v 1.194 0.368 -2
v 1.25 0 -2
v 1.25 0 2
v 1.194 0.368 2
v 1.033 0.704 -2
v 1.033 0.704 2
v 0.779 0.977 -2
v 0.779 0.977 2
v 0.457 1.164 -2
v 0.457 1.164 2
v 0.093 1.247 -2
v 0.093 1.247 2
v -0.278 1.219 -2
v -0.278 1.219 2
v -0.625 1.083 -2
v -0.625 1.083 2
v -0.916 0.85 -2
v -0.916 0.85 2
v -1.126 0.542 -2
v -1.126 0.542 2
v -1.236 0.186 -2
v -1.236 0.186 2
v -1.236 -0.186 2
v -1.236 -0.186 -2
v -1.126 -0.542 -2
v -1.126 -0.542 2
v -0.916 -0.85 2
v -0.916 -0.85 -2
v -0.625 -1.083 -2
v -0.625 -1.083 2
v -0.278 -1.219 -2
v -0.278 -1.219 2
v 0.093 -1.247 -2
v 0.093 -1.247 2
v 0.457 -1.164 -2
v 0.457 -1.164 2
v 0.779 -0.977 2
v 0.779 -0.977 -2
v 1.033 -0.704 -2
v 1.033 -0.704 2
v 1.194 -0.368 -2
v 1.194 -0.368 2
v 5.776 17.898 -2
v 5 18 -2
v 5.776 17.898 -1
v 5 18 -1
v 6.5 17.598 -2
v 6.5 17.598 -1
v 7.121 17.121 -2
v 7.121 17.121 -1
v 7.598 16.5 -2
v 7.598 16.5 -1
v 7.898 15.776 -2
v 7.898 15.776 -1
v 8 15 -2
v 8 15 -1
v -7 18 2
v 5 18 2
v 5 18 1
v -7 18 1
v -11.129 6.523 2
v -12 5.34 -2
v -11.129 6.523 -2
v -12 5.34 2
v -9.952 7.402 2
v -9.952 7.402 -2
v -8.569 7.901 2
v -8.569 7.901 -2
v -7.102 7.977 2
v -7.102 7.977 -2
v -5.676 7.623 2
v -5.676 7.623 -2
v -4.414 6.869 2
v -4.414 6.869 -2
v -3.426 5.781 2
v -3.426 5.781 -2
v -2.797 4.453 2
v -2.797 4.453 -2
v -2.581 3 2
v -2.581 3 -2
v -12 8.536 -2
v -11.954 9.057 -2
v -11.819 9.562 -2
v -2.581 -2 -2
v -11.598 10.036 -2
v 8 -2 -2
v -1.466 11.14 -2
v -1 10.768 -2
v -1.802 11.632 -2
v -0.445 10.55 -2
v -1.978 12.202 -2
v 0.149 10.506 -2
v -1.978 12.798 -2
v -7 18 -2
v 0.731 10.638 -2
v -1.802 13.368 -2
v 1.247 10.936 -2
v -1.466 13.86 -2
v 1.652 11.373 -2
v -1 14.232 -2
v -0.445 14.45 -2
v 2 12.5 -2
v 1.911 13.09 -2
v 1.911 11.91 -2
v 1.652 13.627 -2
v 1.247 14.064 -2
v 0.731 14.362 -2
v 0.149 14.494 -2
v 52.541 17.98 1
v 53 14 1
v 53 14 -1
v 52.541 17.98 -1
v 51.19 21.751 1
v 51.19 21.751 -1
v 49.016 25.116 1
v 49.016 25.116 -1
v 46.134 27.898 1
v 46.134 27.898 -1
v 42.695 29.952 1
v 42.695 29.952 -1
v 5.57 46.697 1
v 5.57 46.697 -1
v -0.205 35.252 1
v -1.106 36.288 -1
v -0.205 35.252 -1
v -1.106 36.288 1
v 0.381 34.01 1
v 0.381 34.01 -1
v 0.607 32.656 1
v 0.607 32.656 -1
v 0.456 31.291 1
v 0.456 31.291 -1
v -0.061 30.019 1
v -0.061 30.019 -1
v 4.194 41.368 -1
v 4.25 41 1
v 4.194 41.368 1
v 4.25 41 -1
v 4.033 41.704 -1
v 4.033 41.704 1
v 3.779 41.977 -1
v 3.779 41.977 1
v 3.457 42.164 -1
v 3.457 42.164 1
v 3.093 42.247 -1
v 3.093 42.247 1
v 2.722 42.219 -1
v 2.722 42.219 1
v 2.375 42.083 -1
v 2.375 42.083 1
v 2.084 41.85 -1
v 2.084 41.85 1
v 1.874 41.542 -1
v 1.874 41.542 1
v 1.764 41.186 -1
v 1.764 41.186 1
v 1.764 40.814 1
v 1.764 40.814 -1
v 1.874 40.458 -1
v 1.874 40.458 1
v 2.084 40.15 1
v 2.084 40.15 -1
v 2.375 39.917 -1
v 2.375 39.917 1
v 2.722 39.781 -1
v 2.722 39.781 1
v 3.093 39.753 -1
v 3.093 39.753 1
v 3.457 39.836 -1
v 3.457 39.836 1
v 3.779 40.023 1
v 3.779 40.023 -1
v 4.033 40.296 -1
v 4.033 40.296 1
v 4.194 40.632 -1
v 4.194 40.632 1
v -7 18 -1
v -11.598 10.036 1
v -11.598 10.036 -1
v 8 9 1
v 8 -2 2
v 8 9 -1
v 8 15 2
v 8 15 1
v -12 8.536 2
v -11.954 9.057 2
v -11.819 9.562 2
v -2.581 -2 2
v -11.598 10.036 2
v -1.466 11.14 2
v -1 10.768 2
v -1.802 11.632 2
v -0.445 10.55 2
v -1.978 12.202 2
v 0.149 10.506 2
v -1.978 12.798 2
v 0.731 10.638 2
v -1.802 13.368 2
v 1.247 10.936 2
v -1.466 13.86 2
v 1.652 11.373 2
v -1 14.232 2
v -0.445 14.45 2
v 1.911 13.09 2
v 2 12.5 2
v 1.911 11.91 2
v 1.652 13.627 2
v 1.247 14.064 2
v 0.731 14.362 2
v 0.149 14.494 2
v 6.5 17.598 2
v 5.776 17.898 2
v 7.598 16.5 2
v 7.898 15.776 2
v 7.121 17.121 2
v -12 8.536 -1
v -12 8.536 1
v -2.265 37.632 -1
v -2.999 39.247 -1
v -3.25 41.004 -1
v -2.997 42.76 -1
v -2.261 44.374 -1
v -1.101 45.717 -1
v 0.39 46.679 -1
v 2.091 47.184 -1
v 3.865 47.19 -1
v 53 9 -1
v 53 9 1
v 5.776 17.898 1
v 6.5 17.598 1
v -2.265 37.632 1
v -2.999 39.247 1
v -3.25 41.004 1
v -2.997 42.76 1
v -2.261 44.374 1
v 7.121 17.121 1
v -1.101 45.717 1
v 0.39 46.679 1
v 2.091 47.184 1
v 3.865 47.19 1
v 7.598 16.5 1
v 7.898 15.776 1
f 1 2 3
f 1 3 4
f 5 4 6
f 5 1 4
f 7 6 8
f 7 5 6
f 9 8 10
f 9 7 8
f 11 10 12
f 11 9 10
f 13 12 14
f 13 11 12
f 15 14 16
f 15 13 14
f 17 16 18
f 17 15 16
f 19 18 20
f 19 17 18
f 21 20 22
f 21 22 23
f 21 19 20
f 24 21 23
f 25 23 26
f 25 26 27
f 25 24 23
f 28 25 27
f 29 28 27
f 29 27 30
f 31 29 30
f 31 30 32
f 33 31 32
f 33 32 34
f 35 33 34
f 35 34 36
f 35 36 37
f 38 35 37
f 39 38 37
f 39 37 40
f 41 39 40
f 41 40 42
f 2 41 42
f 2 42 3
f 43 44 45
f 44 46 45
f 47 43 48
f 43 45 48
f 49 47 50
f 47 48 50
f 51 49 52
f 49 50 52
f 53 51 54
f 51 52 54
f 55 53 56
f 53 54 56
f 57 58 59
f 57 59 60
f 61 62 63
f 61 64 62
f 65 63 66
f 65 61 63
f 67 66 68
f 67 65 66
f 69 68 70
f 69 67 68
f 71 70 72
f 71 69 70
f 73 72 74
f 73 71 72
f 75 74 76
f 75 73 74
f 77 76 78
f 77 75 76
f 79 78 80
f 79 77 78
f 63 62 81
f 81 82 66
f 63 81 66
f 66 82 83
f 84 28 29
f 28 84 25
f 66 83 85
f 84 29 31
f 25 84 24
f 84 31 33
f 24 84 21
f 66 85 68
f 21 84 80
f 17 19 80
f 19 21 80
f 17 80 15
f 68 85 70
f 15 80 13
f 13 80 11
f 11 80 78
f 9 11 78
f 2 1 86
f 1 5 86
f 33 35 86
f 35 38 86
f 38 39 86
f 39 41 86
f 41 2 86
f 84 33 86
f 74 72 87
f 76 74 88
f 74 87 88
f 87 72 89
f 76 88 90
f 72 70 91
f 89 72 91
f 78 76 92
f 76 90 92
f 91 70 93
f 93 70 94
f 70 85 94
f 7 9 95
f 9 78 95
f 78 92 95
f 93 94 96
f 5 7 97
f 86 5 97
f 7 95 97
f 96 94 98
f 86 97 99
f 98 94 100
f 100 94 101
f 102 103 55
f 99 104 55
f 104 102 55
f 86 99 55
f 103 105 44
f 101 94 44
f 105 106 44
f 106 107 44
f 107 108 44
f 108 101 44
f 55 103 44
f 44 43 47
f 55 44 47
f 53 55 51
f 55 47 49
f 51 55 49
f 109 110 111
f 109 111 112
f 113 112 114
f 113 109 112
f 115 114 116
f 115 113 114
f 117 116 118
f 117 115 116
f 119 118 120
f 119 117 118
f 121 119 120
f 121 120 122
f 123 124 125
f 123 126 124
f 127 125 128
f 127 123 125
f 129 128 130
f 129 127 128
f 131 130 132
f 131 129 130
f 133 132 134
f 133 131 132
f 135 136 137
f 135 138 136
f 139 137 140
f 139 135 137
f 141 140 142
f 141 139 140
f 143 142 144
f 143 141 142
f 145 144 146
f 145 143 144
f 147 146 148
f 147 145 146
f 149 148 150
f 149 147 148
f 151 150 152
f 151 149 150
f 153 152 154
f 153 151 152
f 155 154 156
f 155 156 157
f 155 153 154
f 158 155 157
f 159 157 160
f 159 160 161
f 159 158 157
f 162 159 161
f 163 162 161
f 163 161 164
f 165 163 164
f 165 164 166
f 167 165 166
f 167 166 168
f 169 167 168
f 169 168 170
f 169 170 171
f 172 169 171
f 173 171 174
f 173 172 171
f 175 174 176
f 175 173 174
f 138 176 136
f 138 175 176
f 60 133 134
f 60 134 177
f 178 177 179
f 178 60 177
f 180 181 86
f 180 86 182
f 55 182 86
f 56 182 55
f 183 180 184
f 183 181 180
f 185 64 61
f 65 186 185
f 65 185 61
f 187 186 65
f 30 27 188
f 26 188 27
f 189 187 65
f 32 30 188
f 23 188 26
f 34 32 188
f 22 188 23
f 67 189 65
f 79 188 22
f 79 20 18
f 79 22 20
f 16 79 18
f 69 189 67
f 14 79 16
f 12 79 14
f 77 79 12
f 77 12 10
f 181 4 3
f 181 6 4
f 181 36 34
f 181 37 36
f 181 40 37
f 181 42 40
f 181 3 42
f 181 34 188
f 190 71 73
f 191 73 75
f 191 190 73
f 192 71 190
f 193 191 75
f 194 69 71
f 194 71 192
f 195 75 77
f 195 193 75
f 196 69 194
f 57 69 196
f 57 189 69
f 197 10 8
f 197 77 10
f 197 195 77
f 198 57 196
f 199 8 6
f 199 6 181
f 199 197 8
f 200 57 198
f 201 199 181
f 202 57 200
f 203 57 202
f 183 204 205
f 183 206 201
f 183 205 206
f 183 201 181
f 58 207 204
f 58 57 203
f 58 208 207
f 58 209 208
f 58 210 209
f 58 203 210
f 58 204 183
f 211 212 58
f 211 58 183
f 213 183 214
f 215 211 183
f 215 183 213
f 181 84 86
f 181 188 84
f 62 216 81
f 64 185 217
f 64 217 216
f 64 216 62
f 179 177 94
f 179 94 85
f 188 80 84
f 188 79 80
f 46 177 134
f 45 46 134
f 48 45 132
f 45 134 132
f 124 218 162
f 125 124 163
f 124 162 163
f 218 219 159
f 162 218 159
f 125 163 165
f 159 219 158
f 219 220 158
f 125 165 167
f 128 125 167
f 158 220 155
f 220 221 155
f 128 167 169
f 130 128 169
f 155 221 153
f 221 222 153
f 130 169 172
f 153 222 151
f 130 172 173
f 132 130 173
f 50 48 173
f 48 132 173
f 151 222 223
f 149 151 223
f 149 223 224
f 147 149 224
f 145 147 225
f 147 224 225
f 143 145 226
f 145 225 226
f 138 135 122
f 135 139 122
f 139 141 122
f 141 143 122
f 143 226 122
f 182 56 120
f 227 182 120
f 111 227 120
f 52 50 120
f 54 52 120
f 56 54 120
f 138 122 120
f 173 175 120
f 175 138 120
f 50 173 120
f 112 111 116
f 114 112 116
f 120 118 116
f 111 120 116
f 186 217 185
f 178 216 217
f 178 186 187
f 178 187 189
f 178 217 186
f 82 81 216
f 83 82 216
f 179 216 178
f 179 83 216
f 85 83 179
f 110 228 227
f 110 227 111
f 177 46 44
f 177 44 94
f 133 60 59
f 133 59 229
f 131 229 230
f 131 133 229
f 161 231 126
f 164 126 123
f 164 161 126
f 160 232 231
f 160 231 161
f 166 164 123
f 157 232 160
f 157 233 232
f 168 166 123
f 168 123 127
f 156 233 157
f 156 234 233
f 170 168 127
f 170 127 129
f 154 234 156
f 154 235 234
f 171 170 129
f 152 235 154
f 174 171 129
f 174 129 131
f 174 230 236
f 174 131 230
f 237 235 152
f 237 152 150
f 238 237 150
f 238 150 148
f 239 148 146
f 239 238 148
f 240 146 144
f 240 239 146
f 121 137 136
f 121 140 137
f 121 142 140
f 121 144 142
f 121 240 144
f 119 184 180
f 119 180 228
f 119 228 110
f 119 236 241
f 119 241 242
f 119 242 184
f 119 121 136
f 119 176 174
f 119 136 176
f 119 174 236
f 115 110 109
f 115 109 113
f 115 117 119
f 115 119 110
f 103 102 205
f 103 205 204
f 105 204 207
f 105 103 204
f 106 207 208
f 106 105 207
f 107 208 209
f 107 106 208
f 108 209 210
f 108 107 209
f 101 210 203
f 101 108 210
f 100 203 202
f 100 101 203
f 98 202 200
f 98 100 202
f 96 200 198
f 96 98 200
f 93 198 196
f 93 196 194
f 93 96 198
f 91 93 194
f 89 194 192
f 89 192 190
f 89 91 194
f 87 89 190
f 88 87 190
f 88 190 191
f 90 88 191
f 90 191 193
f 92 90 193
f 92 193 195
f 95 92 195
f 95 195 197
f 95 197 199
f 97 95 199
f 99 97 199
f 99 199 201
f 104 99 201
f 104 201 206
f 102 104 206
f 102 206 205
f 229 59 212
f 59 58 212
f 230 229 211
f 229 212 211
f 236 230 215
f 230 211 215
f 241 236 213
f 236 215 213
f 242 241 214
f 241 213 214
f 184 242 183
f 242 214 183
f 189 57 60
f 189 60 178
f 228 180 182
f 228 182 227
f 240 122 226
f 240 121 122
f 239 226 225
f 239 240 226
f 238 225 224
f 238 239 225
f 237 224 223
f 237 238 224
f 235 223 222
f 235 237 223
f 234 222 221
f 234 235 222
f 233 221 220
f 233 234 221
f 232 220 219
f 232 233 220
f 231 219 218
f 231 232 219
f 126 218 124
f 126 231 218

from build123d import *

# Parameters (mm, degrees)
SKETCH1_R           = 1.25
SKETCH1_R_2         = 2
BOSS_EXTRUDE1_DEPTH = 1
SKETCH1_3_R         = 1.25
SKETCH1_3_R_2       = 2
BOSS_EXTRUDE2_DEPTH = 2
FILLET1_R           = 3


with BuildPart() as part:
    # Sketch1 → Boss-Extrude1 (new, symmetric)
    with BuildSketch(Plane.XY):
        with BuildLine():
            Line((-2.581223152, 3), (-2.581223152, -2))
            Line((-2.581223152, -2), (8, -2))
            Line((8, -2), (8, 9))
            Line((8, 9), (53, 9))
            Line((53, 9), (53, 14))
            ThreePointArc((53, 14), (50.1997341, 23.495673614), (42.695106585, 29.952443112))
            Line((42.695106585, 29.952443112), (5.569680923, 46.697301111))
            ThreePointArc((5.569680923, 46.697301111), (-2.260977773, 44.374109196), (-1.106198045, 36.288138625))
            ThreePointArc((-1.106198045, 36.288138625), (0.540780767, 33.340838667), (-0.061029462, 30.018649525))
            Line((-0.061029462, 30.018649525), (-12, 9.339745962))
            Line((-12, 9.339745962), (-12, 5.339745962))
            ThreePointArc((-12, 5.339745962), (-6.375794647, 7.852519152), (-2.581223152, 3))
        make_face()
        Circle(SKETCH1_R, mode=Mode.SUBTRACT)
        with Locations((0, 12.5)):
            Circle(SKETCH1_R_2, mode=Mode.SUBTRACT)
        with Locations((3, 41)):
            Circle(SKETCH1_R, mode=Mode.SUBTRACT)
    extrude(amount=BOSS_EXTRUDE1_DEPTH, both=True)

    # Sketch1<3> → Boss-Extrude2 (add, symmetric)
    with BuildSketch(Plane.XY):
        with BuildLine():
            Line((-2.581223152, 3), (-2.581223152, -2))
            Line((-2.581223152, -2), (8, -2))
            Line((8, -2), (8, 9))
            Line((8, 9), (8, 18))
            Line((8, 18), (-7, 18))
            Line((-7, 18), (-12, 9.339745962))
            Line((-12, 9.339745962), (-12, 5.339745962))
            ThreePointArc((-12, 5.339745962), (-6.375794647, 7.852519152), (-2.581223152, 3))
        make_face()
        Circle(SKETCH1_3_R, mode=Mode.SUBTRACT)
        with Locations((0, 12.5)):
            Circle(SKETCH1_3_R_2, mode=Mode.SUBTRACT)
    extrude(amount=BOSS_EXTRUDE2_DEPTH, both=True)

    # Fillet1
    fillet1_edges = [part.edges().sort_by_distance(p)[0] for p in [
        (-12, 9.339745962, 0),
        (8, 18, -1.5),
        (8, 18, 1.5),
    ]]
    fillet(fillet1_edges, radius=FILLET1_R)


solid = part.part
